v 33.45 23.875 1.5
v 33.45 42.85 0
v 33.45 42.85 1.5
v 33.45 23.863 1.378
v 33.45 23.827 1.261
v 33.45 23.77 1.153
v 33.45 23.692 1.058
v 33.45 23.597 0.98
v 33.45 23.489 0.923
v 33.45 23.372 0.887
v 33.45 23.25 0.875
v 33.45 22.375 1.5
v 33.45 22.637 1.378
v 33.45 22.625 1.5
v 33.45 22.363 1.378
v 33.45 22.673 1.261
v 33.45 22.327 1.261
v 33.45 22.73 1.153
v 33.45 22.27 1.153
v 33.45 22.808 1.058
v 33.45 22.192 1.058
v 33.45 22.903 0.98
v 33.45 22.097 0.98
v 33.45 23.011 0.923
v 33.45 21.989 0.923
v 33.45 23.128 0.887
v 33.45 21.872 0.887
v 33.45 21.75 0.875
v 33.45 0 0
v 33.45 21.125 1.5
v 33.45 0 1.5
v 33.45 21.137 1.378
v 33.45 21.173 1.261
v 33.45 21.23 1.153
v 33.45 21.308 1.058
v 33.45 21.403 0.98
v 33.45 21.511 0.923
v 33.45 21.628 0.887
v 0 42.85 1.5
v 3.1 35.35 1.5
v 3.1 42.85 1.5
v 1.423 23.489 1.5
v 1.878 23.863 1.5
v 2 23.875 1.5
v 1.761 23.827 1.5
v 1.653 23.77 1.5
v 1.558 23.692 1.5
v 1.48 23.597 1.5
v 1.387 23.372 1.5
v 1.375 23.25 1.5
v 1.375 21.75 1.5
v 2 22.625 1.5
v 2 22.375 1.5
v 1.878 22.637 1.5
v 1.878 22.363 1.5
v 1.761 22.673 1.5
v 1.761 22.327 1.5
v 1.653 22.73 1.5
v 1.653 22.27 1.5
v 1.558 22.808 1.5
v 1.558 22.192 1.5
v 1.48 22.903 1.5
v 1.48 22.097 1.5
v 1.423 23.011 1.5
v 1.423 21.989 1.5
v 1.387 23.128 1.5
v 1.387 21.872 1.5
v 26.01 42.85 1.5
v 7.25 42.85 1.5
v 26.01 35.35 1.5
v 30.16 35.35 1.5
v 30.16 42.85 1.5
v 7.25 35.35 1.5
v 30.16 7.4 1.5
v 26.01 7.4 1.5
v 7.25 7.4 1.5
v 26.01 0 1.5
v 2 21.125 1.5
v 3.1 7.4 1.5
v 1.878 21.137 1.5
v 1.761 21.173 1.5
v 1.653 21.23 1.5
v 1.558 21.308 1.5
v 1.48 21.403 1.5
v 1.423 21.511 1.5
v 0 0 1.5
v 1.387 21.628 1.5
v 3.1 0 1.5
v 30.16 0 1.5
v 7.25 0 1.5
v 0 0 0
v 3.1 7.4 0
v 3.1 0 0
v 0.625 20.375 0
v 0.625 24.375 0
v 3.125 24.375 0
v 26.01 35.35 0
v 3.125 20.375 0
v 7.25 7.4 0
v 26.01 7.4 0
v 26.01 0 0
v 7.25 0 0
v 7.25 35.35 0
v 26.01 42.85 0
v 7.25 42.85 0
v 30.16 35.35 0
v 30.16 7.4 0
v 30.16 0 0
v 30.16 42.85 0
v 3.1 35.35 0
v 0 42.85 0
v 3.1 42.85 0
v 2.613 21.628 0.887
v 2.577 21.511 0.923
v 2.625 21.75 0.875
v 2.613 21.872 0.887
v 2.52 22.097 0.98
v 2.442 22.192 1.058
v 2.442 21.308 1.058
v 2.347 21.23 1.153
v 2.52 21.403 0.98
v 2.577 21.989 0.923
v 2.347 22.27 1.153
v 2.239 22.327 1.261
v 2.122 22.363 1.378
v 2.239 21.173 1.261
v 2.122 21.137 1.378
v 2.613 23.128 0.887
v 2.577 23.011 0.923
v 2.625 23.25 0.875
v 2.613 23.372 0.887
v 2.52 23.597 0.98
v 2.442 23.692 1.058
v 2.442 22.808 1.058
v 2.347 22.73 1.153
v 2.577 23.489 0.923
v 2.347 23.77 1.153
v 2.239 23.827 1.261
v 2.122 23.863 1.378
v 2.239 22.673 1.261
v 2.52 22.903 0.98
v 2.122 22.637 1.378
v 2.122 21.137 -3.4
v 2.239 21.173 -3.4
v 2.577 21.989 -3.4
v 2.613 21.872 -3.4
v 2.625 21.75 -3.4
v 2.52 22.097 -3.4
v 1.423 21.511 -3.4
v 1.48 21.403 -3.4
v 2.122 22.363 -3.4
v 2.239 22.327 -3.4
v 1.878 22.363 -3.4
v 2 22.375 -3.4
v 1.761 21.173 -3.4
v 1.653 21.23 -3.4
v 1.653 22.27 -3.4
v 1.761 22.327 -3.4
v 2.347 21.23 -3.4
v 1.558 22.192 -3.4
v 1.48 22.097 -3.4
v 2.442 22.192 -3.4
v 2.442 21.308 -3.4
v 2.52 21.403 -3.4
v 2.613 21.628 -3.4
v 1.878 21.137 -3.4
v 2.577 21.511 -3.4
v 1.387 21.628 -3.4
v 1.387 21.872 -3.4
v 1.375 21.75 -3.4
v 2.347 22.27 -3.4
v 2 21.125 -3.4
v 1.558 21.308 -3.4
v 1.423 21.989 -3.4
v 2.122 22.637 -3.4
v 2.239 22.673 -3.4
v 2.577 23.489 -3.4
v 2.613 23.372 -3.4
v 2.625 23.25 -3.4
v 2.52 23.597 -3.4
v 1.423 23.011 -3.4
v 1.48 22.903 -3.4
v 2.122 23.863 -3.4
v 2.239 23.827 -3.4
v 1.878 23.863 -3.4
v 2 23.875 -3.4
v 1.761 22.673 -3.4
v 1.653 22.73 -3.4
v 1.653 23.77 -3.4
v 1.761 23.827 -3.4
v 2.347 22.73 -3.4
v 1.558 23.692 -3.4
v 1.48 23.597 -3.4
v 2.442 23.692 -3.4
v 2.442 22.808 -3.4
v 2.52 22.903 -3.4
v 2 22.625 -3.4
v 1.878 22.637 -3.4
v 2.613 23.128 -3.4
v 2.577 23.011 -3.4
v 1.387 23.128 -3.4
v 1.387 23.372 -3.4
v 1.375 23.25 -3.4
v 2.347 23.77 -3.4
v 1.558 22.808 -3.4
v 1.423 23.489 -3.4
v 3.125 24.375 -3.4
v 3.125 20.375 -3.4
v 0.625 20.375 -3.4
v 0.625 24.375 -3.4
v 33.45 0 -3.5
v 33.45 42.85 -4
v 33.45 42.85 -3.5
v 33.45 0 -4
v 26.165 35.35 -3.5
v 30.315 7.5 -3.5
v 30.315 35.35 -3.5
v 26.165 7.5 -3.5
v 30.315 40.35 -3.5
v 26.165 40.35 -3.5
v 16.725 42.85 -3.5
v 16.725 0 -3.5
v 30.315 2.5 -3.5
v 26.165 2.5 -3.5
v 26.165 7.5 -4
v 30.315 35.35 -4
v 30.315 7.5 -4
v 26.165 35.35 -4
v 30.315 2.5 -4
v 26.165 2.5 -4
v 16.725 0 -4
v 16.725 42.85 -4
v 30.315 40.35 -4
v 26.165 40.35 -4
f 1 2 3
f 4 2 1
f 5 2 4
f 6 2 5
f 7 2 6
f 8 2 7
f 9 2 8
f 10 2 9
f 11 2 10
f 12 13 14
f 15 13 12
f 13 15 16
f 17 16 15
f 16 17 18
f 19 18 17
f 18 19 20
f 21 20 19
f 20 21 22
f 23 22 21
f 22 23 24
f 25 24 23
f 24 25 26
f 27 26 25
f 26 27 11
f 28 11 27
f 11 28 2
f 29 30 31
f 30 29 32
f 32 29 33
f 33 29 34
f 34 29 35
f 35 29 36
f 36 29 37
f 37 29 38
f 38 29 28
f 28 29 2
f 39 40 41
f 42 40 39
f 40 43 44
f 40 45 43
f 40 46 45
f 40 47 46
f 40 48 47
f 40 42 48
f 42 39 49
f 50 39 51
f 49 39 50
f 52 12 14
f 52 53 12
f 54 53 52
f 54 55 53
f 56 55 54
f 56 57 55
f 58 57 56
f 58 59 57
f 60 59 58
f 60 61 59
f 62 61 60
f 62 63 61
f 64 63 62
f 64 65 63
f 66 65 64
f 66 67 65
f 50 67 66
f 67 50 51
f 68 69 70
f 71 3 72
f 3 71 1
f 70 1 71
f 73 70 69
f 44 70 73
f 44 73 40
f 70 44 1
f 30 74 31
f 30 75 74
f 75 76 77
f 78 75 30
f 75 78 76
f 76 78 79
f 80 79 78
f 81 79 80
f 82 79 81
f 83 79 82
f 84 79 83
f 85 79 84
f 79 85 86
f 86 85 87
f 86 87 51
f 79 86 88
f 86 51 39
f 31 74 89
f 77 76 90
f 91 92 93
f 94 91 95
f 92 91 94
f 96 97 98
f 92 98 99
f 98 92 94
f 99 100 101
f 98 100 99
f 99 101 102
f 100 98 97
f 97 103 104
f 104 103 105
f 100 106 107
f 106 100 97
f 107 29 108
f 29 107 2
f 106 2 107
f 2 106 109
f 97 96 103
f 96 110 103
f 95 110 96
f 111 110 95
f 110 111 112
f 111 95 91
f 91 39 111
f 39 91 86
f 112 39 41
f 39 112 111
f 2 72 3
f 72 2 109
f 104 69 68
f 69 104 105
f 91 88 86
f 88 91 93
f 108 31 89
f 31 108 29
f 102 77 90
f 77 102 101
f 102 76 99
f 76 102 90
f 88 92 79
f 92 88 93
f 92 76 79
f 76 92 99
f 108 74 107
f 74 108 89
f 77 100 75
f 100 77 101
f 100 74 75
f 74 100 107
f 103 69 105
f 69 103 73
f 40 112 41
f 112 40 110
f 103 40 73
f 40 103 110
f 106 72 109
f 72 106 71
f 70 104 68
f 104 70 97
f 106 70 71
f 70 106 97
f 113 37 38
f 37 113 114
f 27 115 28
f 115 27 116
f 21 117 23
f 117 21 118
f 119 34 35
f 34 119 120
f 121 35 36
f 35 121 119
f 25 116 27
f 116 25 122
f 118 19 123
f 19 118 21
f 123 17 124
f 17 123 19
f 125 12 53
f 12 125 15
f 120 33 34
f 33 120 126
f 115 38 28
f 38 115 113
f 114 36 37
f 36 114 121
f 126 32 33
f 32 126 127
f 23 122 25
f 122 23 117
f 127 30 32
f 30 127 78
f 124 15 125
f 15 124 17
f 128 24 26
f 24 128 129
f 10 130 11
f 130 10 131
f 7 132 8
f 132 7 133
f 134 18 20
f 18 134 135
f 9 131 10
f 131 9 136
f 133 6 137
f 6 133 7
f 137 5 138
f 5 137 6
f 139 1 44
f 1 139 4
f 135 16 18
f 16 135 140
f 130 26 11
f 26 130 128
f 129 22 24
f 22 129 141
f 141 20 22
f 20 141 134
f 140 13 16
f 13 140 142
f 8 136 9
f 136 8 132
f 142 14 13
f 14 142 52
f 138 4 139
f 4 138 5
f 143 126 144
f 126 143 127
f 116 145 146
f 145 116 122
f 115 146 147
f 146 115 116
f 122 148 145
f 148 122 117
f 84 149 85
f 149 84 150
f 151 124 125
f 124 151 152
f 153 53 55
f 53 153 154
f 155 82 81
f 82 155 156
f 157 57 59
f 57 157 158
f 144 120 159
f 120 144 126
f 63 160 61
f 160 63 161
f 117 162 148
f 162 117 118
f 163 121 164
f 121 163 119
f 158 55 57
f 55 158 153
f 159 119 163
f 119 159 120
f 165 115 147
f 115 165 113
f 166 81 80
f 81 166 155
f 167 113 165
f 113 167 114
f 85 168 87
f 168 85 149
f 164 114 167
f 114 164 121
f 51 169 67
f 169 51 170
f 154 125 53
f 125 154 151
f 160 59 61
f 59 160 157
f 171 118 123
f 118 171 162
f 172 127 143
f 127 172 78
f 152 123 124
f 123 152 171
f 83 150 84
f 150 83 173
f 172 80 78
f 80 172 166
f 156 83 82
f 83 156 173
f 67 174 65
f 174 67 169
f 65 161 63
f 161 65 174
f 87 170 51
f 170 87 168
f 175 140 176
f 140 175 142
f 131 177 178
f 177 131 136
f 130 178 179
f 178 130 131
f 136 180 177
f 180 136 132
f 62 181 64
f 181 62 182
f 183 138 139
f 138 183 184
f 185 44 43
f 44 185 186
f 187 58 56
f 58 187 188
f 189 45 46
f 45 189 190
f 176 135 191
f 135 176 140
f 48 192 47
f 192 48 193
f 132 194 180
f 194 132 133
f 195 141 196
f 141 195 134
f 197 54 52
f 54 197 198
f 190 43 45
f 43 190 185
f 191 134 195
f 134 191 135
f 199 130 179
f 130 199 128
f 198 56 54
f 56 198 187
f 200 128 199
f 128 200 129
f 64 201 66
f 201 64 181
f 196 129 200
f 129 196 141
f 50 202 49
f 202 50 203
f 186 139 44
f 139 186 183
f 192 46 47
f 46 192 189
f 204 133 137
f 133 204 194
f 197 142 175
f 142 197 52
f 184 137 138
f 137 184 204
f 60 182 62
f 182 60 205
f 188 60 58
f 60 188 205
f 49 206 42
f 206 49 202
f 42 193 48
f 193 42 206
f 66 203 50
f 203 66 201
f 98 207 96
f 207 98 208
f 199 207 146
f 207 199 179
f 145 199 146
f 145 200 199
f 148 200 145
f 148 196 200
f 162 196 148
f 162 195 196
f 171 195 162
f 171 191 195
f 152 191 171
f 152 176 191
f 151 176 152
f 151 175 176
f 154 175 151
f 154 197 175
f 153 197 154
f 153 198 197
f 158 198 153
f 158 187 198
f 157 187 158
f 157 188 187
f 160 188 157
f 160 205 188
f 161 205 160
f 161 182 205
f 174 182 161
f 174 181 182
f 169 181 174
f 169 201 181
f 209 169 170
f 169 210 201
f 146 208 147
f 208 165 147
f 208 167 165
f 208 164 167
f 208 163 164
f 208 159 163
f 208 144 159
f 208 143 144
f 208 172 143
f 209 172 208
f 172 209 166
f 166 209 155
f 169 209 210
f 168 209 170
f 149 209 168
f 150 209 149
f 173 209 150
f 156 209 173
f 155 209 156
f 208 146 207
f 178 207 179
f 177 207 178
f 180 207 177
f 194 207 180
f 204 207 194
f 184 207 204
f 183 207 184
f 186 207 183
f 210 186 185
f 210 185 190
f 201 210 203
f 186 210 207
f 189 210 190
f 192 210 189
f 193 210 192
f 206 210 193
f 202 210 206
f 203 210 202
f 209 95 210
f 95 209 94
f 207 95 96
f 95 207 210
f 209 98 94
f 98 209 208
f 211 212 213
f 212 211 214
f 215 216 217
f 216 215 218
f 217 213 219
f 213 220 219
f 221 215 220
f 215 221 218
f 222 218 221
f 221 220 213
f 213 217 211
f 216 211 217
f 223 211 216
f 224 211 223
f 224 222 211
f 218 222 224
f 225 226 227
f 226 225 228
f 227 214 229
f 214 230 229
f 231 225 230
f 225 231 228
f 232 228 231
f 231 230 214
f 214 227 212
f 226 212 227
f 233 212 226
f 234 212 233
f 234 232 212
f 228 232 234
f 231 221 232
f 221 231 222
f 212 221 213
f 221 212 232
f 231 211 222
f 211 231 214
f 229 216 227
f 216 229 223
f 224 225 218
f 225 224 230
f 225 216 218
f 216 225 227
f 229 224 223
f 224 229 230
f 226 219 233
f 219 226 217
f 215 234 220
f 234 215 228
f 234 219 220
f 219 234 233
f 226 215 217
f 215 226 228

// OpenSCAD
//translate([49,25,8])
union () {
difference () {
cube([33.45,42.85,1.5]);

//Screw Cubes
//top left
translate([3.1,-0.1,-0.1])
cube([4.15,7.5,4.2]);

//bottom left
translate([26.01,-0.1,-0.1])
cube([4.15,7.5,4.2]);

//top right
translate([3.1,35.35,-0.1])
cube([4.15,7.5,4.2]);

//bottom right
translate([26.01,35.35,-0.1])
cube([4.15,7.5,4.2]);

rotate([0,90,0])
translate([-1.5,21.75,2])
cylinder(d=1.25, h=34, $fn=32);

rotate([0,90,0])
translate([-1.5,23.25,2])
cylinder(d=1.25, h=34, $fn=32);

translate([2,21.75,-1.3])
cylinder(d=1.25, h=4.2, $fn=32);

translate([2,23.25,-1.3])
cylinder(d=1.25, h=4.2, $fn=32);
}

translate([0.625,20.375,-3.4])
difference () {
cube([2.5,4,4]);

translate([1.375,1.375,-.1])
cylinder(d=1.25, h=4.2, $fn=32);

translate([1.375,2.875,-.1])
cylinder(d=1.25, h=4.2, $fn=32);


}
}


//Plate for Tubing Pressure
translate([16.725,0, -4])
difference () {
cube([16.725,42.85,0.5]);
    
    translate([9.44,2.5,0])
    cube([4.15,5,4.2]);

    translate([9.44,35.35,0])
    cube([4.15,5,4.2]);    
}
